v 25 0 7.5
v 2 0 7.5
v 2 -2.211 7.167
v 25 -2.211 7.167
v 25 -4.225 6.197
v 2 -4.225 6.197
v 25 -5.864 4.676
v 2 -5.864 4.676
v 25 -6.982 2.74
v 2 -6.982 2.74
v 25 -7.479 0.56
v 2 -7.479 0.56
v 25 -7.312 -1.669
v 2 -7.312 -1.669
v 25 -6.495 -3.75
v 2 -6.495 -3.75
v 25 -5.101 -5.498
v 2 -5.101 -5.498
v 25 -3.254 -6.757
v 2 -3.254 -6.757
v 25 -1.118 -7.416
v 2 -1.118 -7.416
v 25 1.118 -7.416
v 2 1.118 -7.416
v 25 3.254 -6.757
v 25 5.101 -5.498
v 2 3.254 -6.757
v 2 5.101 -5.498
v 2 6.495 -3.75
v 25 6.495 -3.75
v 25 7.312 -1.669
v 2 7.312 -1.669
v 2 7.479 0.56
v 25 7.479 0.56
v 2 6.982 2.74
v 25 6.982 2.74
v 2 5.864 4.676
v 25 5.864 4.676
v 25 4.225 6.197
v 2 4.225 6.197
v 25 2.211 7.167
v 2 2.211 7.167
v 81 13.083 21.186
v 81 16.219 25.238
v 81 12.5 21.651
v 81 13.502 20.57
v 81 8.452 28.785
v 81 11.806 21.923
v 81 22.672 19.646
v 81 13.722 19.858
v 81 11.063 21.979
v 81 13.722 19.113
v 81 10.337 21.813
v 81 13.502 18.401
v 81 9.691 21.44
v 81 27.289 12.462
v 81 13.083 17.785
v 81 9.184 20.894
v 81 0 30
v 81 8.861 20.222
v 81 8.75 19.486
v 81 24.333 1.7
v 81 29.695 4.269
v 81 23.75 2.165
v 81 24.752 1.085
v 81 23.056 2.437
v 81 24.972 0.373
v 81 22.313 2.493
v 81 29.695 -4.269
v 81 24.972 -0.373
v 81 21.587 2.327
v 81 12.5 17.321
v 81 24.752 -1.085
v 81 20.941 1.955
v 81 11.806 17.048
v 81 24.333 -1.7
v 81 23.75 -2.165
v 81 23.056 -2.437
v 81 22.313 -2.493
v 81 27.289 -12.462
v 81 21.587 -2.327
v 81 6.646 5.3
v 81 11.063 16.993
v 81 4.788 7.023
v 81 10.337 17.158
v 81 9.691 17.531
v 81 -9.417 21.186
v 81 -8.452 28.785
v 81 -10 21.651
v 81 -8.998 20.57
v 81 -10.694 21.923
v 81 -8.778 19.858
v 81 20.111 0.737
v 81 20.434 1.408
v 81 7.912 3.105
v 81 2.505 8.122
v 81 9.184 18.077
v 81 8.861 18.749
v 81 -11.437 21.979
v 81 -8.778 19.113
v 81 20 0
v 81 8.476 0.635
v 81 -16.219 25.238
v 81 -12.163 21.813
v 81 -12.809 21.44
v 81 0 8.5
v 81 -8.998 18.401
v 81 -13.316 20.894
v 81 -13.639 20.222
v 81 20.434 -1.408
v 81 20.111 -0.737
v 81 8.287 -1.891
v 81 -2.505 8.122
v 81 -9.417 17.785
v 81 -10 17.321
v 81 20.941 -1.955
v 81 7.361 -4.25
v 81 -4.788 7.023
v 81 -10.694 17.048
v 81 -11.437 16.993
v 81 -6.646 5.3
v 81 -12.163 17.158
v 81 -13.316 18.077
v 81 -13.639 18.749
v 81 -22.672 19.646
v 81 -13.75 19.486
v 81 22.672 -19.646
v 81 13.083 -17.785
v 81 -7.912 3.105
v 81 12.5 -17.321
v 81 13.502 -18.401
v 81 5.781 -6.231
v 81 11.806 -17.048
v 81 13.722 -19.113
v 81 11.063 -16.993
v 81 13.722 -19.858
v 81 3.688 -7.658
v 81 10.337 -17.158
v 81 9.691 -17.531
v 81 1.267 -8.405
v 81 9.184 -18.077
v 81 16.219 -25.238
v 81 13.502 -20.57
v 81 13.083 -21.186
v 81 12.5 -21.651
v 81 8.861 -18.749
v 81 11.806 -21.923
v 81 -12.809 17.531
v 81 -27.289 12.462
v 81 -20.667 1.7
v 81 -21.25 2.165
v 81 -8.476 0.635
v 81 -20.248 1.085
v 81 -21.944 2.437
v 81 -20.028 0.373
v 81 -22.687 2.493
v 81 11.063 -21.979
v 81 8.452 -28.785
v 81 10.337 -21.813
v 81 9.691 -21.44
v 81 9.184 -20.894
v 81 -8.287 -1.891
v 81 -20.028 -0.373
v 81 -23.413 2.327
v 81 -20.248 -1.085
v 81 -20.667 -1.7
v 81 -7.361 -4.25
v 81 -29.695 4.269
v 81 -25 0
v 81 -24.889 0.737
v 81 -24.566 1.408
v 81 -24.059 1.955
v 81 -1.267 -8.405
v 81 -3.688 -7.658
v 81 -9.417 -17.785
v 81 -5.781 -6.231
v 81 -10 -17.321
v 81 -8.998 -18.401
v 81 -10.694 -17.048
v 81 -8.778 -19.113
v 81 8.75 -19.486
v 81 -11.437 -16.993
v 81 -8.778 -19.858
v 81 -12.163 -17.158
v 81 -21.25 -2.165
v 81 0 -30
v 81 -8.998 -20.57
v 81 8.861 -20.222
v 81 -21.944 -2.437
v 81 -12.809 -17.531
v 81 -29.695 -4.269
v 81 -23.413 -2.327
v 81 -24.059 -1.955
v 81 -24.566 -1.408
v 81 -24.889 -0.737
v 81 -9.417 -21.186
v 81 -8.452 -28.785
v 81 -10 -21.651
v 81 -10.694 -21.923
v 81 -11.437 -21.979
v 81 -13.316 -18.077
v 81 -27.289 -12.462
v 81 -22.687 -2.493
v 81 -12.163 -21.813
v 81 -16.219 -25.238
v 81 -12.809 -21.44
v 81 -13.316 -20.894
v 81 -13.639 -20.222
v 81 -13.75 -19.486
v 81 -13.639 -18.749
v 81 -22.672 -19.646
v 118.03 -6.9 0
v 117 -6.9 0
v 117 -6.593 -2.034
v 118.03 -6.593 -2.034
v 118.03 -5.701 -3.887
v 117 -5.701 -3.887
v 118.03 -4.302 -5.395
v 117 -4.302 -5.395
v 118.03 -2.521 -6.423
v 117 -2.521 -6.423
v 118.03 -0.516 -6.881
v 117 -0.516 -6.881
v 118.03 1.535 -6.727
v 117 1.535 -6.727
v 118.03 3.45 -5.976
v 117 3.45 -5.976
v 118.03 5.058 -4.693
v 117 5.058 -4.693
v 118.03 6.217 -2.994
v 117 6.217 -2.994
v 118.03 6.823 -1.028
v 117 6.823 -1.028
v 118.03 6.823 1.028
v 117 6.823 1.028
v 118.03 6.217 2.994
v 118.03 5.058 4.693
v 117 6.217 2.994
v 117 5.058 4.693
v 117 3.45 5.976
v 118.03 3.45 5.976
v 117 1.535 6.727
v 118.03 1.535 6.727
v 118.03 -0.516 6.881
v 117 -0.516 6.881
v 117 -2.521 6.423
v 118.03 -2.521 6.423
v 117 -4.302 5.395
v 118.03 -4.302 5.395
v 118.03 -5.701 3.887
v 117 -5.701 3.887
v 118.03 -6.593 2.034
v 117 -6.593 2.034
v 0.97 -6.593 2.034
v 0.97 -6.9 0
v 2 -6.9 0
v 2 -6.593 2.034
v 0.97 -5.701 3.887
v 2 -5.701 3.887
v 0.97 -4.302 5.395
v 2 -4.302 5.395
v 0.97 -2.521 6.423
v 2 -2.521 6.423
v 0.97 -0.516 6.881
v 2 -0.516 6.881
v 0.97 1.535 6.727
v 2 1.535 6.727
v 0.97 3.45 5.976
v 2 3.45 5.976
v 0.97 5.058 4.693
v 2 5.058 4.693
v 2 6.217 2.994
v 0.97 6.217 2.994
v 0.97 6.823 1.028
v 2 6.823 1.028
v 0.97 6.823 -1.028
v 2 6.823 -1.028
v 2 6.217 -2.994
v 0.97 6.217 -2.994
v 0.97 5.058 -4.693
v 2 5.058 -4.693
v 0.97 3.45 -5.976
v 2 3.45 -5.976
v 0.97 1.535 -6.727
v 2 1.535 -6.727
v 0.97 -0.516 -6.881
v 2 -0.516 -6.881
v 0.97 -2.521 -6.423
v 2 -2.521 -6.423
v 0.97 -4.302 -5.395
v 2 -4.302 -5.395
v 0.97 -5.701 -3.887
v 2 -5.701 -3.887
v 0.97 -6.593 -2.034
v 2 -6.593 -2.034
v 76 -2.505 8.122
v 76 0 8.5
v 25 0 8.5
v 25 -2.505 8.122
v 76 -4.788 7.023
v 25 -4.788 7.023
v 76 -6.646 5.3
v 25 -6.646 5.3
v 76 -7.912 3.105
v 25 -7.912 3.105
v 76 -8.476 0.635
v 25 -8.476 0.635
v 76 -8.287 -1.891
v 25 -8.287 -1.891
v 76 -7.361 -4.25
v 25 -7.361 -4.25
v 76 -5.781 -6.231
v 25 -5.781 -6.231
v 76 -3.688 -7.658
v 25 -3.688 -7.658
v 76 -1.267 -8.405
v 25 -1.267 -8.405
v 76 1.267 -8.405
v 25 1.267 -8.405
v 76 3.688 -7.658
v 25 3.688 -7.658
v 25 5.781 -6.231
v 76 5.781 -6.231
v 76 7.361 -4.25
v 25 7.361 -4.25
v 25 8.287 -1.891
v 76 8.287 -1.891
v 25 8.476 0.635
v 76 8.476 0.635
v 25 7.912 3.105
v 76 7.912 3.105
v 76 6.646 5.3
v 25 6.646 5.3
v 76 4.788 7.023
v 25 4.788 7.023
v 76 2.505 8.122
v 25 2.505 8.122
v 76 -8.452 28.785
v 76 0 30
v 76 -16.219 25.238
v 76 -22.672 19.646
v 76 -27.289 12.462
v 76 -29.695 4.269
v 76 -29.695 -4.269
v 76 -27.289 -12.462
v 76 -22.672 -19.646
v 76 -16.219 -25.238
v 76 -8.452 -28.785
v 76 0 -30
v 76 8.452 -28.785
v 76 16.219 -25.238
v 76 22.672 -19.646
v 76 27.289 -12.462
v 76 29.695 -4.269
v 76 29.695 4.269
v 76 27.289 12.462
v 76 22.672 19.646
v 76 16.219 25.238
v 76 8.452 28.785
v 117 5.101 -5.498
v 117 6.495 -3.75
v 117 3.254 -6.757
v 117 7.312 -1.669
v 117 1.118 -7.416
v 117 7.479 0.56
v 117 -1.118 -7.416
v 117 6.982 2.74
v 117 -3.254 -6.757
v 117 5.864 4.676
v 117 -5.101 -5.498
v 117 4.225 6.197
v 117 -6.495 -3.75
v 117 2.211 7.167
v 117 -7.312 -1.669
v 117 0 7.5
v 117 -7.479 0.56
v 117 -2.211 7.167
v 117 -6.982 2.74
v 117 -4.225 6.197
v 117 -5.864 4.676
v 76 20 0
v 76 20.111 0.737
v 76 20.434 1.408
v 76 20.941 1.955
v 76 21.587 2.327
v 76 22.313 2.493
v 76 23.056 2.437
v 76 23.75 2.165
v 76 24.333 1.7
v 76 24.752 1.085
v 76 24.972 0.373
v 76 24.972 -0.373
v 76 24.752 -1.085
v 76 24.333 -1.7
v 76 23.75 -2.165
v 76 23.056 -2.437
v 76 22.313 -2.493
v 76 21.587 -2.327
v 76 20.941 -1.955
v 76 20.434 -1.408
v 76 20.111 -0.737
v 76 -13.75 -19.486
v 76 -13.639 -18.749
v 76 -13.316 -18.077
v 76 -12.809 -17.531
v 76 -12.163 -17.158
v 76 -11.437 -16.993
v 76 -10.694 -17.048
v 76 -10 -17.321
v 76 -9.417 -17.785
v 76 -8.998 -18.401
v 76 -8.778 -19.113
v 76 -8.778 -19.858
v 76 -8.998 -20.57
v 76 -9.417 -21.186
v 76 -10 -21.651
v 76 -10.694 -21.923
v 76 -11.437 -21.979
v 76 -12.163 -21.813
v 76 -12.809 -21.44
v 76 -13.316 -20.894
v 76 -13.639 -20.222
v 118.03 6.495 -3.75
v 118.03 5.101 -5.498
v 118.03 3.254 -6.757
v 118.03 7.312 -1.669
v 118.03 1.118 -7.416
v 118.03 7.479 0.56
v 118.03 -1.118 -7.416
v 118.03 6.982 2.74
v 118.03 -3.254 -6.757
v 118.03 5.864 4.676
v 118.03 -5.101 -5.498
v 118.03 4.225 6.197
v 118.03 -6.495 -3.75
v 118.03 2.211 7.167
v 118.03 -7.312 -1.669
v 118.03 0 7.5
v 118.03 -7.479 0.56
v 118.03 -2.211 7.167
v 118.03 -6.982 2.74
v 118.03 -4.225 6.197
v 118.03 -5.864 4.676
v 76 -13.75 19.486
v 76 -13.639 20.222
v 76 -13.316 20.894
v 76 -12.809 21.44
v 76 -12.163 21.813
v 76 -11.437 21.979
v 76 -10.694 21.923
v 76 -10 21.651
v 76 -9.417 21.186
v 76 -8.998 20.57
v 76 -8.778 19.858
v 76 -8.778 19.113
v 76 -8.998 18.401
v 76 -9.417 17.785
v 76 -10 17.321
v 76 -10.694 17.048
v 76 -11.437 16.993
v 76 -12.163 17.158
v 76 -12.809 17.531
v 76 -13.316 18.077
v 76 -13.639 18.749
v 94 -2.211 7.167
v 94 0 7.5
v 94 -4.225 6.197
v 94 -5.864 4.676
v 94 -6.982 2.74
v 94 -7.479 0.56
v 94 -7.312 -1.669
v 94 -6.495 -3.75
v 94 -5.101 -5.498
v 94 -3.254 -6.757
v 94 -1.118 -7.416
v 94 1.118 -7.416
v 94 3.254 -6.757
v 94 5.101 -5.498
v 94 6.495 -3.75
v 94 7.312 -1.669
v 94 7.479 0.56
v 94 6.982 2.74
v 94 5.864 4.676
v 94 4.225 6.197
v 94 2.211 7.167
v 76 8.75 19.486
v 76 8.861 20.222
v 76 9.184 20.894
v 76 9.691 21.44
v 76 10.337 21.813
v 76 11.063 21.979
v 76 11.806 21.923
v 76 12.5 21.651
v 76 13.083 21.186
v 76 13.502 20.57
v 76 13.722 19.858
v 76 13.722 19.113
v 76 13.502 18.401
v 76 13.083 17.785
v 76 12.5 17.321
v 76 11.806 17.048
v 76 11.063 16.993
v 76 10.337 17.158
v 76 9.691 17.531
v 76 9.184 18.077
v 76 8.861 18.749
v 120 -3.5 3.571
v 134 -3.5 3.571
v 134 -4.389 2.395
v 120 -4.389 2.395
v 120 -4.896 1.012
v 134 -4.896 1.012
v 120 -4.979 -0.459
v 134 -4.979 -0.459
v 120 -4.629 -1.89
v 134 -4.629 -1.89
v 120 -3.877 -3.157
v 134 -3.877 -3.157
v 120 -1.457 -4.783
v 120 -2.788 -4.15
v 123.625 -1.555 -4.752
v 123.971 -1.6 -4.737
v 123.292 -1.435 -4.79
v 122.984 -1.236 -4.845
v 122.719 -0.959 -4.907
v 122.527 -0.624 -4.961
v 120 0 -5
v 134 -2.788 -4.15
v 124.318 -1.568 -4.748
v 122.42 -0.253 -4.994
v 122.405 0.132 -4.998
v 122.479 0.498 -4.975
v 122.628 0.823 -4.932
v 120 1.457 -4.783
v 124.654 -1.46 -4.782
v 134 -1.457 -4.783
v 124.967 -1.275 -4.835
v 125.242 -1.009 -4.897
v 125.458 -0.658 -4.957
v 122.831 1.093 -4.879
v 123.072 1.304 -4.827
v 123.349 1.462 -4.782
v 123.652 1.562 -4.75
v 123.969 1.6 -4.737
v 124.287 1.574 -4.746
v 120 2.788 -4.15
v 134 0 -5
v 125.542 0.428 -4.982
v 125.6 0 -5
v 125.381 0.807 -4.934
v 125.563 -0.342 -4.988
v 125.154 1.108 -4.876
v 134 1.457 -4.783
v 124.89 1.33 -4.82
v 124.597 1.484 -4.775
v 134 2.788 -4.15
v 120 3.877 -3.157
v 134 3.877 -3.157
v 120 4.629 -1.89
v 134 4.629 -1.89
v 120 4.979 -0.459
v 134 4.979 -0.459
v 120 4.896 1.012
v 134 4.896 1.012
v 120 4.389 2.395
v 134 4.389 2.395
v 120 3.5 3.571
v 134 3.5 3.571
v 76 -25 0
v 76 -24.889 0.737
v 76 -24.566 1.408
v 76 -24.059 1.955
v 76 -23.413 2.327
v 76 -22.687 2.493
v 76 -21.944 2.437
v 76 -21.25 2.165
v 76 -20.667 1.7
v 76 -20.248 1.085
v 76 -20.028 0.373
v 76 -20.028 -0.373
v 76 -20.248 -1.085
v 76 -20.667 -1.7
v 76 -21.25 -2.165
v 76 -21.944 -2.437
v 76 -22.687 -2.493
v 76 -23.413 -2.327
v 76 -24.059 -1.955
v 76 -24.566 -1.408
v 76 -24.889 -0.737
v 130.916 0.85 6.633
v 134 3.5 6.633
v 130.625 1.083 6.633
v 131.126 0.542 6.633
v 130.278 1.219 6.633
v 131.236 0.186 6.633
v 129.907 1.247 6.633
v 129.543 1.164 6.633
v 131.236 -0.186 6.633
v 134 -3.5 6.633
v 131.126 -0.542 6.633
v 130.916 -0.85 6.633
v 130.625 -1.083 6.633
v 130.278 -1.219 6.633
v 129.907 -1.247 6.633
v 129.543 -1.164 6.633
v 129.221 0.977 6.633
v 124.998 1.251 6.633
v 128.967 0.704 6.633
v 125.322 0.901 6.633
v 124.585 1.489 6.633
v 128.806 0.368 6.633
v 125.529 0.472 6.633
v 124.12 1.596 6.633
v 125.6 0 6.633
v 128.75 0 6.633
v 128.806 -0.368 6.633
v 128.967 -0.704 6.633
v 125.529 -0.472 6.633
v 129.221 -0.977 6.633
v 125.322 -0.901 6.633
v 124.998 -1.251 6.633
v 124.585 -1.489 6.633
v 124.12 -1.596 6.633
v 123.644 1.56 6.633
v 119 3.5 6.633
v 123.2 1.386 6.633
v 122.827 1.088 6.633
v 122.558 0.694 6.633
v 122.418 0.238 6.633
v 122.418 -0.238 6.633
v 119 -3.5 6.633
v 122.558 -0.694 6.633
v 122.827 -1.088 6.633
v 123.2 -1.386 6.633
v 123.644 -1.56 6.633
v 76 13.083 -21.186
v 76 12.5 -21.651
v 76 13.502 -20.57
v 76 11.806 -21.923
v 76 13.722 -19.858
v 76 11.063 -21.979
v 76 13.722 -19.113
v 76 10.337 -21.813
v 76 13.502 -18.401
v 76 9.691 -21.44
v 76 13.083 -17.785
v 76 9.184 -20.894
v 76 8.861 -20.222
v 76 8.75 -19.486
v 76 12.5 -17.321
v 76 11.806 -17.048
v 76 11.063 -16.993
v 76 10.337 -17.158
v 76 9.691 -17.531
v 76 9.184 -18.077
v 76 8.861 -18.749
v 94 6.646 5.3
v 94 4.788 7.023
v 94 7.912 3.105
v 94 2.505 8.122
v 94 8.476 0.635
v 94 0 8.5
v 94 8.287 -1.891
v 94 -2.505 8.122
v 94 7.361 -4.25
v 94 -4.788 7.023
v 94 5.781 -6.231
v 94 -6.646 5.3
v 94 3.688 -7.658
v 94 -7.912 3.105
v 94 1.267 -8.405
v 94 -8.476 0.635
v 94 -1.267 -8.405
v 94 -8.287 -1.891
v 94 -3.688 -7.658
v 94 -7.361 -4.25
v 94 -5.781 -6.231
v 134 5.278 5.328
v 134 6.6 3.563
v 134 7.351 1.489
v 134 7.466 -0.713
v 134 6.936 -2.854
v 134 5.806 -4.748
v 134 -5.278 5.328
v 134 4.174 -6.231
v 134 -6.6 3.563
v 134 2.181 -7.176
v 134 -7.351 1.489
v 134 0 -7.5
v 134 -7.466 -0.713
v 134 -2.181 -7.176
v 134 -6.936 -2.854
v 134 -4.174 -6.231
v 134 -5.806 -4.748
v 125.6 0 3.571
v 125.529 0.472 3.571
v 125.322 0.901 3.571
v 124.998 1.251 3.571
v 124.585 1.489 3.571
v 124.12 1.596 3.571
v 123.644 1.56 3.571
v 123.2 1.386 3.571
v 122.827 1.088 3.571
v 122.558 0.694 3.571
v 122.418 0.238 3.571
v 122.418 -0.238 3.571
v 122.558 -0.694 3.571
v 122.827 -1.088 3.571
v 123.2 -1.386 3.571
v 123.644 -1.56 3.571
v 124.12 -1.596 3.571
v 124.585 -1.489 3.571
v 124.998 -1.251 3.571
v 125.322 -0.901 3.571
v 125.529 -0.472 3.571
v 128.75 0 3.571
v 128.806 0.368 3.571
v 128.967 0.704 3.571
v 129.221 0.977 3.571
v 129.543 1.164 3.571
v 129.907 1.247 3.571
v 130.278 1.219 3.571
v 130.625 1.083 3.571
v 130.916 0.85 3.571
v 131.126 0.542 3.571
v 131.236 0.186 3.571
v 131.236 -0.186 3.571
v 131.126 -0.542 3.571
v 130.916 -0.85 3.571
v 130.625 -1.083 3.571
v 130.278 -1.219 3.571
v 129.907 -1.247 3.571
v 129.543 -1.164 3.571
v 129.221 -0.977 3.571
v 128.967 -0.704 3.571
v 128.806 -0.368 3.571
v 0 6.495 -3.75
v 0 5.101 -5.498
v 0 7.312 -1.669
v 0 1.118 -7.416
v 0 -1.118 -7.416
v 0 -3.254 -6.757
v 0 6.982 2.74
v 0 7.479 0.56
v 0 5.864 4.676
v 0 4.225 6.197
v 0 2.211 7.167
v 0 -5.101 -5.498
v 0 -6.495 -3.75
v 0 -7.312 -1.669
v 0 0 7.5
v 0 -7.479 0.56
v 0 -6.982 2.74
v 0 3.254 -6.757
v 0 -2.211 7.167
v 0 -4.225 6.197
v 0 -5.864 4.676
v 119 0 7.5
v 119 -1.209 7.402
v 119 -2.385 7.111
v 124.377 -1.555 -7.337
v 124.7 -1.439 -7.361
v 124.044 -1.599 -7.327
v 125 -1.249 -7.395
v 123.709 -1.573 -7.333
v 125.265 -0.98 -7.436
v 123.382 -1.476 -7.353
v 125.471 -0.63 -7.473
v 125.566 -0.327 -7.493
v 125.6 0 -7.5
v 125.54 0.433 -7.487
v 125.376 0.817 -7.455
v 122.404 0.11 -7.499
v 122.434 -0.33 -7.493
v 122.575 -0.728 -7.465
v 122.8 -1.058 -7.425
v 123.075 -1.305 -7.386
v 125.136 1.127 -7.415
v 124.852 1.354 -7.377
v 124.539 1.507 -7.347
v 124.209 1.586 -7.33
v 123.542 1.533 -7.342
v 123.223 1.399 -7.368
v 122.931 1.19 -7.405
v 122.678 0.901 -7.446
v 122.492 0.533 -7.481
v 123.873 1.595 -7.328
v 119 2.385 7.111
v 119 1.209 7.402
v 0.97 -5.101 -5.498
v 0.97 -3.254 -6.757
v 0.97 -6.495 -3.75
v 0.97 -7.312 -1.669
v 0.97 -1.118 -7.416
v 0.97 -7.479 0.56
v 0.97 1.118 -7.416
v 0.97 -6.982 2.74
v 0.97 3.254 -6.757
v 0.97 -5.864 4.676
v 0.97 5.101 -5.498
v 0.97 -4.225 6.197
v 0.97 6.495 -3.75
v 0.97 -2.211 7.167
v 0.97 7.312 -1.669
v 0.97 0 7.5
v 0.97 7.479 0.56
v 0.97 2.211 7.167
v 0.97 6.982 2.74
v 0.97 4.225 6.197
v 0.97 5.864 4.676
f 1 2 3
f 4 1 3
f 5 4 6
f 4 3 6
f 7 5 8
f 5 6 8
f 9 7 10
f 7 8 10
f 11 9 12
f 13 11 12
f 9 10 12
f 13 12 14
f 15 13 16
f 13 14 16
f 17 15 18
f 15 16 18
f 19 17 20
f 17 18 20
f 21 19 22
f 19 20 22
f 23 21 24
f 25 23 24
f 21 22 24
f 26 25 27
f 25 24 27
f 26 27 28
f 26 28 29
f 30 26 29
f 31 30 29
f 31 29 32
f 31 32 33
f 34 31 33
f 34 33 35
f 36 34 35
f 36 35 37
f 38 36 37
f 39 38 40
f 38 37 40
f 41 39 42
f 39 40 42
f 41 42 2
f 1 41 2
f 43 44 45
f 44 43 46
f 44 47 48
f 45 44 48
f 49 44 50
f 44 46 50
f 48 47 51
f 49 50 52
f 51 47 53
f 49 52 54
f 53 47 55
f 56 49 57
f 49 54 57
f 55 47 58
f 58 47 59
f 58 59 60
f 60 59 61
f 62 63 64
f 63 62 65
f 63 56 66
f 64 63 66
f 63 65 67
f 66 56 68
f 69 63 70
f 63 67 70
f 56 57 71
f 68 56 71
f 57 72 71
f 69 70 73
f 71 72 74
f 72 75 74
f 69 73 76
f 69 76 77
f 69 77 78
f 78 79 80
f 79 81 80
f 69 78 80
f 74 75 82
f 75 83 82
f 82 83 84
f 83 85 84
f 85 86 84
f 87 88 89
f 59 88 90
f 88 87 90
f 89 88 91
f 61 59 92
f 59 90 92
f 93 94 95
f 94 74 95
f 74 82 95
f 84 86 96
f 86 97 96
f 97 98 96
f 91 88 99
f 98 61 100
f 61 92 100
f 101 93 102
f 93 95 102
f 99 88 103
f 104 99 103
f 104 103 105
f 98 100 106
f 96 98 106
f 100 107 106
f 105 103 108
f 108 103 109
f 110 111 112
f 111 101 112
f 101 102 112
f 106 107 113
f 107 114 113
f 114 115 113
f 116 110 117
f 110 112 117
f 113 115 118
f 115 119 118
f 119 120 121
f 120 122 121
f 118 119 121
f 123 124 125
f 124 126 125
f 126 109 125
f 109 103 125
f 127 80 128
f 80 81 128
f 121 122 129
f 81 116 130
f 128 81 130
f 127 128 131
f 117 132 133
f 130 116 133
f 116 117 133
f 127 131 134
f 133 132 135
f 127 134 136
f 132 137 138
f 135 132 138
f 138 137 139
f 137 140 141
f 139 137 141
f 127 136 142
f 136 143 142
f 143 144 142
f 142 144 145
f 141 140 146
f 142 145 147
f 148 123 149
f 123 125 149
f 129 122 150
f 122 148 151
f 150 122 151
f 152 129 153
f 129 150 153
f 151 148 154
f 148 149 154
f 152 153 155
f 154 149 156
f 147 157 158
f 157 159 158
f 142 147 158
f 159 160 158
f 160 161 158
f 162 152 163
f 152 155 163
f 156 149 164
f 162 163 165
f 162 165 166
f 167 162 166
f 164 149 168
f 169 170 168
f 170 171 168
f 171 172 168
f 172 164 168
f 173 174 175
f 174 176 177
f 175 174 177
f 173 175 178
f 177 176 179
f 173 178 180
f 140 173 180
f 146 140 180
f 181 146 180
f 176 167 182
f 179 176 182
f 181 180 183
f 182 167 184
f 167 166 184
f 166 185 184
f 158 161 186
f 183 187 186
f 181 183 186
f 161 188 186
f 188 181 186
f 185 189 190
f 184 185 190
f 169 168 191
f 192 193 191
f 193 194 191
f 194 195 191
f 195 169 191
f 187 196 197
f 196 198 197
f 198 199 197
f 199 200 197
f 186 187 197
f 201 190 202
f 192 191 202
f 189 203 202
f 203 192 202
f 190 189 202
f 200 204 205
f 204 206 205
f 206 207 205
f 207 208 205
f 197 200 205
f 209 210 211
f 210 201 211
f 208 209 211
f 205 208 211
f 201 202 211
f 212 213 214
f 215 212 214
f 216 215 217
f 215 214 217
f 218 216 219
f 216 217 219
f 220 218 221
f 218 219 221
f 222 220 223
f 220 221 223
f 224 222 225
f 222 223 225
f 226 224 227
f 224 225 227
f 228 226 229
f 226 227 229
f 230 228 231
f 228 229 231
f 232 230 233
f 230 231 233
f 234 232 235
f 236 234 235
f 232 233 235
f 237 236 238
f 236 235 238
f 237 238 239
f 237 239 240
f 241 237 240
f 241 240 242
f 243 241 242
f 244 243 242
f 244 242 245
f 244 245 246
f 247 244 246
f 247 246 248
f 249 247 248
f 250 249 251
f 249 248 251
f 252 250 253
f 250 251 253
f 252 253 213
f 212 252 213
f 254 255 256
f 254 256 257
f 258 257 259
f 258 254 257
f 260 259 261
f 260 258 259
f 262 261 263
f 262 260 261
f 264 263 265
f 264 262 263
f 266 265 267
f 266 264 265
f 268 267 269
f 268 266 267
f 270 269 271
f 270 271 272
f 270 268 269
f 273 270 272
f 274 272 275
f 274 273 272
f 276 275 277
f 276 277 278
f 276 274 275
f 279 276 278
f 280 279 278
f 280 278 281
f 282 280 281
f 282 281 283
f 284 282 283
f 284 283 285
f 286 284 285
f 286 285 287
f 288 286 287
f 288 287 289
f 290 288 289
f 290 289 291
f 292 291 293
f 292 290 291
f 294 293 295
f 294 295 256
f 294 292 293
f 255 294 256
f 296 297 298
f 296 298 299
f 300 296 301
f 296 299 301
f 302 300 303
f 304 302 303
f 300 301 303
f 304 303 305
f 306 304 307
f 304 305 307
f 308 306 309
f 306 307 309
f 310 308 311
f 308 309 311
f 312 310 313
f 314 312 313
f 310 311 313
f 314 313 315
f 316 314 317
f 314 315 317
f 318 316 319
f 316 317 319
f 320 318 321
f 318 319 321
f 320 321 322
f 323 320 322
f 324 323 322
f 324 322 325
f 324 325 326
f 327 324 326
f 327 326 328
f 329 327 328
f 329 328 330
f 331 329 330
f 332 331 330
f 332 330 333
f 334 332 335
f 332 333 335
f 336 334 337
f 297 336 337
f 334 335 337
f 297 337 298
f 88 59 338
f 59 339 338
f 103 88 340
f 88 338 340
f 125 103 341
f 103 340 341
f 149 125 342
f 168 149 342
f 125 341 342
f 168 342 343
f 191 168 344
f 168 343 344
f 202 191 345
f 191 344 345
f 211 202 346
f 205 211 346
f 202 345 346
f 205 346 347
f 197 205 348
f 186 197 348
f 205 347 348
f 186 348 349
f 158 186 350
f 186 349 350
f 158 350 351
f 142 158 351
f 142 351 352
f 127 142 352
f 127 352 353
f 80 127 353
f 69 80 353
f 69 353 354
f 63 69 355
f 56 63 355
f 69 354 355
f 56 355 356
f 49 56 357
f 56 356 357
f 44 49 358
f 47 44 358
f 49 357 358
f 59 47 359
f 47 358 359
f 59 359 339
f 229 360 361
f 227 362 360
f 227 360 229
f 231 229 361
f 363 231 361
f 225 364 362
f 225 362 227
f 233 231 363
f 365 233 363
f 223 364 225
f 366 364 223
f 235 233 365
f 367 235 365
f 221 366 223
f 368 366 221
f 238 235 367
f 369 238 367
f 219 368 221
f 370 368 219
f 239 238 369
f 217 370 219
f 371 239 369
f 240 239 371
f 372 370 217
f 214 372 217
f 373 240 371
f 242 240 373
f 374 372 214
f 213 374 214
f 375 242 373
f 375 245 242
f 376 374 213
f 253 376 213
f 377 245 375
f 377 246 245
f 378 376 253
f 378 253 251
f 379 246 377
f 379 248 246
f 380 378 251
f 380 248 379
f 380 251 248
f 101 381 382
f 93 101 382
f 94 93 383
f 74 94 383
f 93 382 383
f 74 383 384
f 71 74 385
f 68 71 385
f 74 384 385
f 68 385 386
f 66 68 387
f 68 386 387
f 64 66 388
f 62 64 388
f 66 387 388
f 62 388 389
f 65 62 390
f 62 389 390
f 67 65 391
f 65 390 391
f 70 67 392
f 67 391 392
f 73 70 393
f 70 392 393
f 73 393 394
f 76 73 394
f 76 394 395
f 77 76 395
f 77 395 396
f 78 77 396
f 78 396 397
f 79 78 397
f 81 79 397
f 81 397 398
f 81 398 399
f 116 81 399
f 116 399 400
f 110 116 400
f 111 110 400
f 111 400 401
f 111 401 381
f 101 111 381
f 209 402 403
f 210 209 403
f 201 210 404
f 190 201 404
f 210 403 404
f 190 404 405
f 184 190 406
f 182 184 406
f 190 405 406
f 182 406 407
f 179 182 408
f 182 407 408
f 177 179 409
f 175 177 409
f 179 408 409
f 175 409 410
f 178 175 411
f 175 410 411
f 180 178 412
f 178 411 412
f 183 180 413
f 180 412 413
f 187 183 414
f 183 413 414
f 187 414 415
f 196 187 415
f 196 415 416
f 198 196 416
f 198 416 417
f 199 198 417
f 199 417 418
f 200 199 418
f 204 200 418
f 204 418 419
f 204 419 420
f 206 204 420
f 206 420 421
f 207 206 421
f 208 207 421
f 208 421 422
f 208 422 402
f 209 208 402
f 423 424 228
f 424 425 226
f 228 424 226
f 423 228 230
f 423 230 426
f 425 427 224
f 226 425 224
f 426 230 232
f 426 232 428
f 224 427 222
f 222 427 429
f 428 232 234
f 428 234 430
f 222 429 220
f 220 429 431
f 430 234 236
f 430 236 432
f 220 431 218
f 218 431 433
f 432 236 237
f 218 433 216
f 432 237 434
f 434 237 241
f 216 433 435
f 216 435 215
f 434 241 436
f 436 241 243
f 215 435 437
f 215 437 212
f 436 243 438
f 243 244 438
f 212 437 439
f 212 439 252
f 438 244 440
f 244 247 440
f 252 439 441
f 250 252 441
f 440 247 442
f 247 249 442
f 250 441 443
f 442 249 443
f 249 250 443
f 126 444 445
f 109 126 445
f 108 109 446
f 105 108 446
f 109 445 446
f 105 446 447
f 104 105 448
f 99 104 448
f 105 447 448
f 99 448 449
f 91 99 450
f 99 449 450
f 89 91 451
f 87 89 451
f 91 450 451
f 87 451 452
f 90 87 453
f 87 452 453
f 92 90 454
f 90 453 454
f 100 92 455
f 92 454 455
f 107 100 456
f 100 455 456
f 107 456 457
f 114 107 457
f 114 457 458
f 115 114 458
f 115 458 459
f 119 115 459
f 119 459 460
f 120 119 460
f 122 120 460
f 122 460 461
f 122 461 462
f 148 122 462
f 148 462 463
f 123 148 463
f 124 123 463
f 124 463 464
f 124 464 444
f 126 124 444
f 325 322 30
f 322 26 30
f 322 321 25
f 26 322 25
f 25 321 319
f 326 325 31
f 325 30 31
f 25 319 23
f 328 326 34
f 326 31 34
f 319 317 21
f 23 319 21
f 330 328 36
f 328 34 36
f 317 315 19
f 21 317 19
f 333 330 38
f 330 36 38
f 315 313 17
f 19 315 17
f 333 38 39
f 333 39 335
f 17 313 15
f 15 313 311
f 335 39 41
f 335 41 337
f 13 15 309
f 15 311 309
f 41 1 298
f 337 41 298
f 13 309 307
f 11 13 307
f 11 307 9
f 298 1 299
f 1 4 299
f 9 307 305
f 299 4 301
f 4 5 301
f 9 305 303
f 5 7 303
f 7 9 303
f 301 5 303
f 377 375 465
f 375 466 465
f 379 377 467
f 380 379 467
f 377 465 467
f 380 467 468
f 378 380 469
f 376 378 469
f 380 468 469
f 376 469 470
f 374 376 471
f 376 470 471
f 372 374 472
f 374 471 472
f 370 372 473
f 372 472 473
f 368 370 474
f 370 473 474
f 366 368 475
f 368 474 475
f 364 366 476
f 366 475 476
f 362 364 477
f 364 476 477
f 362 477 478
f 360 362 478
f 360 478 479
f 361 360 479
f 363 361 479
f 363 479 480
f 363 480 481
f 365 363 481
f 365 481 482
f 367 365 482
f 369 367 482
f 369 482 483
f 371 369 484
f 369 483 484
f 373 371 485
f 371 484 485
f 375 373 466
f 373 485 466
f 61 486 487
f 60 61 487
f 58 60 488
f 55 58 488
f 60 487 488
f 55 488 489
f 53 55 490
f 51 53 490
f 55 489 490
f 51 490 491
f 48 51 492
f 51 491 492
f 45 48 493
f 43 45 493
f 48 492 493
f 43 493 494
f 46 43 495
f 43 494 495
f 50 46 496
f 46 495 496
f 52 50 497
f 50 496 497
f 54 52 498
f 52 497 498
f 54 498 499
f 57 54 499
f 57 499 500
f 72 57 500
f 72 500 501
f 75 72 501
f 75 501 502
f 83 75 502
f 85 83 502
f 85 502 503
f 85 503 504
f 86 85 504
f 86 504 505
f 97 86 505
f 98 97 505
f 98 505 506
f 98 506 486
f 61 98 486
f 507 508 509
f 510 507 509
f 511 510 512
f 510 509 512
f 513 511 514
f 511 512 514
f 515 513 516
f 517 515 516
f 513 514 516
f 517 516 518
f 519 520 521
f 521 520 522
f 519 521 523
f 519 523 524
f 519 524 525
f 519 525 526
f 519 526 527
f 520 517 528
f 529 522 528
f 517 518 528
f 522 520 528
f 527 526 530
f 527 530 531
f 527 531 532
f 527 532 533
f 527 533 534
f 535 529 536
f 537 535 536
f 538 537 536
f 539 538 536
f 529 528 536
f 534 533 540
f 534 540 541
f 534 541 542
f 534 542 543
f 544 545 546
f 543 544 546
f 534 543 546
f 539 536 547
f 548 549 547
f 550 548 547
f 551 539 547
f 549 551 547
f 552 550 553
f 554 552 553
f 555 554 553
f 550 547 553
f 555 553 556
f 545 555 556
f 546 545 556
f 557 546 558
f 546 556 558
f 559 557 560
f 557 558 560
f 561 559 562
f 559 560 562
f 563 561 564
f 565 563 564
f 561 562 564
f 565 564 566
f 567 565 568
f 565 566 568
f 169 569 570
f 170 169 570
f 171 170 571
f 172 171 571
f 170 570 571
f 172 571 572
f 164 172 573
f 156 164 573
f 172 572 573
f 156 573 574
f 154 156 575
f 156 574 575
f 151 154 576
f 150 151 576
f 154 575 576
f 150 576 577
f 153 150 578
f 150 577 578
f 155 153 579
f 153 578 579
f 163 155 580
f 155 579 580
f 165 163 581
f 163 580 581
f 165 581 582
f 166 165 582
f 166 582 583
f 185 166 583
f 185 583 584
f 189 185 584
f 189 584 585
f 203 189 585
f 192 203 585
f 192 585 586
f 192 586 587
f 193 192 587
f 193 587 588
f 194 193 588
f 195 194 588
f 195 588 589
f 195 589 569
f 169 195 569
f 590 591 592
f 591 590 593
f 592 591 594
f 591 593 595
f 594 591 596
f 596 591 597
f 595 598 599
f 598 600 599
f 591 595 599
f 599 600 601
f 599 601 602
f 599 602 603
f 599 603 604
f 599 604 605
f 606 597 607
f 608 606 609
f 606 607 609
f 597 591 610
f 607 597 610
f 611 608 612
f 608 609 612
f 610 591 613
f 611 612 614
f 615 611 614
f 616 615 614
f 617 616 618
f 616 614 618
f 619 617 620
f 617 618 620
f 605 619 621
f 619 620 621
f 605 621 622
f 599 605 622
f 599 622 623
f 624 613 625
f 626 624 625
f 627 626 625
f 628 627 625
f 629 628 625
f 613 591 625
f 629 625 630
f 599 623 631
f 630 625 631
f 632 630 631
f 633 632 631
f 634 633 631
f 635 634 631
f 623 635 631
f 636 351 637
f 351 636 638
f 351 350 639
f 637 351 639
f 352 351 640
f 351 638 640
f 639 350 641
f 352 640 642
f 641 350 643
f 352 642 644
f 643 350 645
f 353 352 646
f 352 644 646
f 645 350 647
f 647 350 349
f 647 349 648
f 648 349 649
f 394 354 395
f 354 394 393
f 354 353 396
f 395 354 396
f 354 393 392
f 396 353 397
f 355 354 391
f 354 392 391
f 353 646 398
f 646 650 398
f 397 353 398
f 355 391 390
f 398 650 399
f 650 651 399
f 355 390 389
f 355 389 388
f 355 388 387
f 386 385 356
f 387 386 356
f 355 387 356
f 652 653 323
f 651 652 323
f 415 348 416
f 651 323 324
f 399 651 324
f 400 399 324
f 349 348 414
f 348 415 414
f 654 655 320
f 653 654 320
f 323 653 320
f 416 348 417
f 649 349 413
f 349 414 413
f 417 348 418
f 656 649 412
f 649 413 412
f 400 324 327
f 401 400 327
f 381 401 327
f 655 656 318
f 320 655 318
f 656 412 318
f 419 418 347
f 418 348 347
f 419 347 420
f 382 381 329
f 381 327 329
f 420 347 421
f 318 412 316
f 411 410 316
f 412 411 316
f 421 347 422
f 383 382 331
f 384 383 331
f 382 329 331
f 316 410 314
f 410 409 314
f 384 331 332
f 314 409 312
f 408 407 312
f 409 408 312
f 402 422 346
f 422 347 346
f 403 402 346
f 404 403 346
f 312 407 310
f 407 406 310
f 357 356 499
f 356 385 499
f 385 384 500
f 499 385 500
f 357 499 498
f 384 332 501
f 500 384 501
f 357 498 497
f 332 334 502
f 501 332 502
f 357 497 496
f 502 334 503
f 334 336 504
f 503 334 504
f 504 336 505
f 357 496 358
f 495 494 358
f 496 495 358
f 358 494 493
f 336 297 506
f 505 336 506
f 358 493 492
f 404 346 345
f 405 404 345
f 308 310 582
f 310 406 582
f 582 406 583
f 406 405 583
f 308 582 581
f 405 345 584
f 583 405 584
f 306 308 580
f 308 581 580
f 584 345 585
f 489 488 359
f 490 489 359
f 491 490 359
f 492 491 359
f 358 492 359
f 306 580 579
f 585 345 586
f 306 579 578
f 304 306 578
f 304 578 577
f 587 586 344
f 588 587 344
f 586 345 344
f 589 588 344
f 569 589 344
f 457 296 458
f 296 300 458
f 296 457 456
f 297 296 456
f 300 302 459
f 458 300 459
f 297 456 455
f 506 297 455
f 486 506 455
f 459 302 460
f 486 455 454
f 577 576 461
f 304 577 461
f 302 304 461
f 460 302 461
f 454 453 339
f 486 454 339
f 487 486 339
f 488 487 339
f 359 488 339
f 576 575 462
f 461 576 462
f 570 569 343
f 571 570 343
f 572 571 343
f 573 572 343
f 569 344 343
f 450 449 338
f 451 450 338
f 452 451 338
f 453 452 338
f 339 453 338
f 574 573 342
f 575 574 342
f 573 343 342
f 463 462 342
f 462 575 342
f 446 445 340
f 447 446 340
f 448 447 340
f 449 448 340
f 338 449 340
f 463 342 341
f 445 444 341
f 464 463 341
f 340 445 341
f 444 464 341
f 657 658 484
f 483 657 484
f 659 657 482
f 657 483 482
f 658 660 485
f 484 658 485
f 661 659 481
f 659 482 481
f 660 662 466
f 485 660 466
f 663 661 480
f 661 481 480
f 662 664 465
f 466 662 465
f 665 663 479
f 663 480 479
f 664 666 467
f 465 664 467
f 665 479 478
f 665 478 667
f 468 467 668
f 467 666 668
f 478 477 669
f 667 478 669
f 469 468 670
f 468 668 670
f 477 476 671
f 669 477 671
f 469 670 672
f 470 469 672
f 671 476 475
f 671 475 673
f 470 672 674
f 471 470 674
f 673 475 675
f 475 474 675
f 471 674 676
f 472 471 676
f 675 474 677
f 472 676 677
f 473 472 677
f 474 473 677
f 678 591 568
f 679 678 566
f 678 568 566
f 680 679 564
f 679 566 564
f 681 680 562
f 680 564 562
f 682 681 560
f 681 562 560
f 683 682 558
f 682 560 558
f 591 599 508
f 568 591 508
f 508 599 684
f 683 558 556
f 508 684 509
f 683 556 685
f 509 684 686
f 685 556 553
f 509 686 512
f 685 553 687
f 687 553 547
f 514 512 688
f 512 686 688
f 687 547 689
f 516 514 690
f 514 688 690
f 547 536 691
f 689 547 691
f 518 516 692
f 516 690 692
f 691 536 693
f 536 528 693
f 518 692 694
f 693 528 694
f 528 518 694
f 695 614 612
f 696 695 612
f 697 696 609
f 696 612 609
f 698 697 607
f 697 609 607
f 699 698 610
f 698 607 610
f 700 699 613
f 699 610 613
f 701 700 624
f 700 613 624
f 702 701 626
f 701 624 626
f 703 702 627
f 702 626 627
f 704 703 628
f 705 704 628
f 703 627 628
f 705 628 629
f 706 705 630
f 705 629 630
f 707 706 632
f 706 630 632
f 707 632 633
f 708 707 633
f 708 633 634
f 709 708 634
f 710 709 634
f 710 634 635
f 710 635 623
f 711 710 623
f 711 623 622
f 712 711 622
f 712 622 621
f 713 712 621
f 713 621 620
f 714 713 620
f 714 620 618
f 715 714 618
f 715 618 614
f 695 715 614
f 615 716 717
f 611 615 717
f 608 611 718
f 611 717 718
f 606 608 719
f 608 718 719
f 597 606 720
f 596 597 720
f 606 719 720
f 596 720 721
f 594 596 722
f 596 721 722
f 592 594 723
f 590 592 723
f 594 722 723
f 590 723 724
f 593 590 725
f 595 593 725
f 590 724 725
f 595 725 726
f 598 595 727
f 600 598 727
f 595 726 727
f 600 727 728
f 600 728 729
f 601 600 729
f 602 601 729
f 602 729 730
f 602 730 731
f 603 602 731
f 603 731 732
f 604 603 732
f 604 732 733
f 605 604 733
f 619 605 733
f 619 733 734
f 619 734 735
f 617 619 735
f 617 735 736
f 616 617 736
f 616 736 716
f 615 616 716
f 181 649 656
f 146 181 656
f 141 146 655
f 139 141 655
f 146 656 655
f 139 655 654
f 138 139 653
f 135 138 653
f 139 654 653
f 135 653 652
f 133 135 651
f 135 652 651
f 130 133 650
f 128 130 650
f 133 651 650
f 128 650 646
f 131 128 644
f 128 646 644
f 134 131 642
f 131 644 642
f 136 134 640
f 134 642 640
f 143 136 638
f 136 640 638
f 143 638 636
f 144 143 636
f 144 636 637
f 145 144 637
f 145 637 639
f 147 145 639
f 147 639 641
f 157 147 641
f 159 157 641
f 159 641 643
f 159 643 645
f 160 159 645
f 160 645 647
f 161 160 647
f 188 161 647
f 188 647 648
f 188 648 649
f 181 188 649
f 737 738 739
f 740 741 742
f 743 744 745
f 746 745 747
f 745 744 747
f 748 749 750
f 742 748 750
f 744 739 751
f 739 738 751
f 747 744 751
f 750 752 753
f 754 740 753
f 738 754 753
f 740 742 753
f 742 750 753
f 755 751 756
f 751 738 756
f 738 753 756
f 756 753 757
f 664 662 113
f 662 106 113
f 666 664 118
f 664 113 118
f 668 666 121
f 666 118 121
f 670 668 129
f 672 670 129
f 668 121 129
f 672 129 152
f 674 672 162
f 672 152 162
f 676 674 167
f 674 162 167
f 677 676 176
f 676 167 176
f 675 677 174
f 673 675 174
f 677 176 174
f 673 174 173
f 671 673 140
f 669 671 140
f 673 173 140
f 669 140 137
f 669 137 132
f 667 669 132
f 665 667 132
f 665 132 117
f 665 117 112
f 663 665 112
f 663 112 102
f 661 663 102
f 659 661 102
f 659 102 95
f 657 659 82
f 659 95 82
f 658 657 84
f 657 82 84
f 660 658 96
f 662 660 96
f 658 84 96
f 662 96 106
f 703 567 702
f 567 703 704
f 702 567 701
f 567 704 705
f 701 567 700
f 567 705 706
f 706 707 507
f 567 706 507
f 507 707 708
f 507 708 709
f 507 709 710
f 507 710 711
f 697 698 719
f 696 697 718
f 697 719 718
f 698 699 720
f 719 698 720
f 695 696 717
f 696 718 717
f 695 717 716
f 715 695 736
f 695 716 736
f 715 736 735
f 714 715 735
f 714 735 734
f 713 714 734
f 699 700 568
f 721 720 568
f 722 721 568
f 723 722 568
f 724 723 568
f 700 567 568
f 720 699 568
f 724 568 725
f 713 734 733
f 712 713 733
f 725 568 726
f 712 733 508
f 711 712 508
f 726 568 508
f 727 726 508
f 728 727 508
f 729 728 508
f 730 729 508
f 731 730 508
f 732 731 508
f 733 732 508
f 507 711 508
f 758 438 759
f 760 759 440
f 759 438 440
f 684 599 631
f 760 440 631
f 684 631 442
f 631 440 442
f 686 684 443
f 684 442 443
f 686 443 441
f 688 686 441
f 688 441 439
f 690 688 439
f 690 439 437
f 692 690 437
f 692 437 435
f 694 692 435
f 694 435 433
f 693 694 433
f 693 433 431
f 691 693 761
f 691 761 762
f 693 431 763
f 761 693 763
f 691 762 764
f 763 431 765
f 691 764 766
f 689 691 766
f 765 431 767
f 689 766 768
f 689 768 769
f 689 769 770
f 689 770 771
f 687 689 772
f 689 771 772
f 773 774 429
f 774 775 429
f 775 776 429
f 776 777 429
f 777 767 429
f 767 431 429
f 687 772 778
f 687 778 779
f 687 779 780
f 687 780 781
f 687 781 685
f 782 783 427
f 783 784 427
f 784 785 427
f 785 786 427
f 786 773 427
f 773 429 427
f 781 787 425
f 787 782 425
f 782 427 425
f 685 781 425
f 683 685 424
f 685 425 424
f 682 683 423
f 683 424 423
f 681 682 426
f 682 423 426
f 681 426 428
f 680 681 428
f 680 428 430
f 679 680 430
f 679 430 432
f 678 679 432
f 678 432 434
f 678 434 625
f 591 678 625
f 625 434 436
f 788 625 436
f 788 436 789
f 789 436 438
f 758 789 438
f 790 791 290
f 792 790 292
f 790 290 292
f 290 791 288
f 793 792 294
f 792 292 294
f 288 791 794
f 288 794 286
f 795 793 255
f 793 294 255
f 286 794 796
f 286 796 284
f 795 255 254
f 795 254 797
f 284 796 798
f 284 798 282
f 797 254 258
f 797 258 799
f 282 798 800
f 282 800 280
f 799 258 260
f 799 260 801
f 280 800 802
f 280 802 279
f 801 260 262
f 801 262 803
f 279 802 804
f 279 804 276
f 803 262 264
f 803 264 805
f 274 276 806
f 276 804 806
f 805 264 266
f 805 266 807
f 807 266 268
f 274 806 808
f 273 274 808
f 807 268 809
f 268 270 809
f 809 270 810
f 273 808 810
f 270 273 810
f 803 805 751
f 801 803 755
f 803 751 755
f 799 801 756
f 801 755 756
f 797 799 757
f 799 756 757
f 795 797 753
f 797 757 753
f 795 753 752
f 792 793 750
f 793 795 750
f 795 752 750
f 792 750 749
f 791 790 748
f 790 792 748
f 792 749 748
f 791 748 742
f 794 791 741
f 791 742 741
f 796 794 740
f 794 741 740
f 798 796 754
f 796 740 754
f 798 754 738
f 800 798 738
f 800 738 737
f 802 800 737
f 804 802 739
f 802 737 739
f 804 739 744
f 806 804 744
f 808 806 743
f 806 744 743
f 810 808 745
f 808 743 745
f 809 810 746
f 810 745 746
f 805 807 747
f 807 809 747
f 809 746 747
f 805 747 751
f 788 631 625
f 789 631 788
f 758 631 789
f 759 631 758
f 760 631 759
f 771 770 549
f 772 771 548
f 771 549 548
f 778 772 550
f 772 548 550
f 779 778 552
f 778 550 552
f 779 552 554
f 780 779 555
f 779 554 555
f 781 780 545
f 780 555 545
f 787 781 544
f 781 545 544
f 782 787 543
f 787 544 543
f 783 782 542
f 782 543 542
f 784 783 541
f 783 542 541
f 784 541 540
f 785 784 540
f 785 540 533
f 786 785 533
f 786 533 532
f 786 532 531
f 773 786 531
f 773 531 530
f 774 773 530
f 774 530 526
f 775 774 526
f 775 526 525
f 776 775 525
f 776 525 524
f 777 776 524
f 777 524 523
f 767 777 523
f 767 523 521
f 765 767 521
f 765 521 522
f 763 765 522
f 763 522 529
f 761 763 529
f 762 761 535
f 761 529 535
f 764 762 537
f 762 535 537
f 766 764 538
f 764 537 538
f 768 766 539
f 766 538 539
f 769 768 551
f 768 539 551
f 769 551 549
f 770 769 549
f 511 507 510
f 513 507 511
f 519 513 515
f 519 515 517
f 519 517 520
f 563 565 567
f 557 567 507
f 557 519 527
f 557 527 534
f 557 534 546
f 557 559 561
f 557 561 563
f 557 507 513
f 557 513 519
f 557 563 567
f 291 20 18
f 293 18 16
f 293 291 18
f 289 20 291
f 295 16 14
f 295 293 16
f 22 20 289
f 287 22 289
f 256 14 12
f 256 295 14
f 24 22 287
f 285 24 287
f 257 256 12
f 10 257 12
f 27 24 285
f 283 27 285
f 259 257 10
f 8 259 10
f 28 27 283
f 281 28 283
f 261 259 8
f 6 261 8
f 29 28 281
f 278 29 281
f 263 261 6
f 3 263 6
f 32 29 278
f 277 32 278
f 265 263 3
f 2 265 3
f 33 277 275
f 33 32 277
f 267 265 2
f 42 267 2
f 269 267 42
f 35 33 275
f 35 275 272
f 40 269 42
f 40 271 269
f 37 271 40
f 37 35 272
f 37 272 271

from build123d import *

# Parameters (mm, degrees)
SKETCH_2_R             = 2.5
CUT_EXTRUDE_1_DEPTH    = 88.040220588
CUT_EXTRUDE_2_DEPTH    = 14
CUT_EXTRUDE_START      = -15
CUT_EXTRUDE_3_DEPTH    = 15
SKETCH_5_R             = 1.6
CUT_EXTRUDE_4_DEPTH    = 143.119650207
HOLE_WIZARD_M3_1_D     = 2.5
HOLE_WIZARD_M3_1_DEPTH = 4
HOLE_WIZARD_M3_1_TIP   = 0.751075774
CUT_EXTRUDE_START_2    = 1.03
SKETCH_8_R             = 7.5
SKETCH_8_R_2           = 6.9
CUT_EXTRUDE_5_DEPTH    = 1.03
SKETCH_9_R             = 7.5
SKETCH_9_R_2           = 6.9
CUT_EXTRUDE_6_DEPTH    = 1.03


with BuildPart() as part:
    # 草图1 → 旋转1 (revolve)
    with BuildSketch(Plane.XY, mode=Mode.PRIVATE) as revolve_1_sk:
        Polygon((0, 0), (134, 0), (134, 7.5), (94, 7.5), (94, 8.5), (81, 8.5), (81, 30), (76, 30), (76, 8.5), (25, 8.5), (25, 7.5), (0, 7.5), align=None)
    revolve(revolve_1_sk.sketch.rotate(Axis((0, 0, 0), (1, 0, 0)), 90), axis=Axis((0, 0, 0), (1, 0, 0)))

    # 草图2 → 切除-拉伸1 (cut, through all)
    with BuildSketch(Plane.ZY.offset(-76)):
        with Locations(Location((0, 22.5, 0), (0, 0, 270))):
            Circle(SKETCH_2_R)
        with Locations(Location((19.485571585, 11.25, 0), (0, 0, 270))):
            Circle(SKETCH_2_R)
        with Locations(Location((19.485571585, -11.25, 0), (0, 0, 270))):
            Circle(SKETCH_2_R)
        with Locations(Location((0, -22.5, 0), (0, 0, 270))):
            Circle(SKETCH_2_R)
        with Locations(Location((-19.485571585, -11.25, 0), (0, 0, 270))):
            Circle(SKETCH_2_R)
        with Locations(Location((-19.485571585, 11.25, 0), (0, 0, 270))):
            Circle(SKETCH_2_R)
    extrude(amount=-CUT_EXTRUDE_1_DEPTH, mode=Mode.SUBTRACT)

    # 草图3 → 切除-拉伸2 (cut)
    with BuildSketch(Plane(origin=(134, 0, 0), x_dir=(0, 0, -1), z_dir=(1, 0, 0))):
        with BuildLine():
            Line((-3.570714214, 3.5), (-3.570714214, -3.5))
            ThreePointArc((-3.570714214, -3.5), (5, 0), (-3.570714214, 3.5))
        make_face()
    extrude(amount=-CUT_EXTRUDE_2_DEPTH, mode=Mode.SUBTRACT)

    # 草图4 → 切除-拉伸3 (cut)
    with BuildSketch(Plane(origin=(134, 0, 0), x_dir=(0, 0, -1), z_dir=(1, 0, 0)).offset(CUT_EXTRUDE_START)):
        with BuildLine():
            Line((-6.633249581, 3.5), (-6.633249581, -3.5))
            ThreePointArc((-6.633249581, -3.5), (-7.5, 0), (-6.633249581, 3.5))
        make_face()
    extrude(amount=CUT_EXTRUDE_3_DEPTH, mode=Mode.SUBTRACT)

    # 草图5 → 切除-拉伸4 (cut, through all)
    with BuildSketch(Plane.XY.offset(6.633249581)):
        with Locations((124, 0)):
            Circle(SKETCH_5_R)
    extrude(amount=-CUT_EXTRUDE_4_DEPTH, mode=Mode.SUBTRACT)

    # M3 螺纹孔1
    with Locations(Plane(origin=(130, 0, 6.633249581), x_dir=(1, 0, 0), z_dir=(0, 0, 1))):
        with Locations((0, 0)):
            Hole(HOLE_WIZARD_M3_1_D / 2, depth=HOLE_WIZARD_M3_1_DEPTH)
            with Locations((0, 0, -(HOLE_WIZARD_M3_1_DEPTH + HOLE_WIZARD_M3_1_TIP / 2))):  # 118° drill point
                Cone(0, HOLE_WIZARD_M3_1_D / 2, HOLE_WIZARD_M3_1_TIP, mode=Mode.SUBTRACT)

    # 草图8 → 切除-拉伸5 (cut)
    with BuildSketch(Plane.ZY.offset(-2).offset(CUT_EXTRUDE_START_2)):
        Circle(SKETCH_8_R)
        with Locations(Location((0, 0, 0), (0, 0, 270))):
            Circle(SKETCH_8_R_2, mode=Mode.SUBTRACT)
    extrude(amount=-CUT_EXTRUDE_5_DEPTH, mode=Mode.SUBTRACT)

    # 草图9 → 切除-拉伸6 (cut)
    with BuildSketch(Plane(origin=(117, 0, 0), x_dir=(0, 0, -1), z_dir=(1, 0, 0))):
        with Locations(Location((0, 0, 0), (0, 0, 180))):
            Circle(SKETCH_9_R)
        with Locations(Location((0, 0, 0), (0, 0, 270))):
            Circle(SKETCH_9_R_2, mode=Mode.SUBTRACT)
    extrude(amount=CUT_EXTRUDE_6_DEPTH, mode=Mode.SUBTRACT)


solid = part.part
